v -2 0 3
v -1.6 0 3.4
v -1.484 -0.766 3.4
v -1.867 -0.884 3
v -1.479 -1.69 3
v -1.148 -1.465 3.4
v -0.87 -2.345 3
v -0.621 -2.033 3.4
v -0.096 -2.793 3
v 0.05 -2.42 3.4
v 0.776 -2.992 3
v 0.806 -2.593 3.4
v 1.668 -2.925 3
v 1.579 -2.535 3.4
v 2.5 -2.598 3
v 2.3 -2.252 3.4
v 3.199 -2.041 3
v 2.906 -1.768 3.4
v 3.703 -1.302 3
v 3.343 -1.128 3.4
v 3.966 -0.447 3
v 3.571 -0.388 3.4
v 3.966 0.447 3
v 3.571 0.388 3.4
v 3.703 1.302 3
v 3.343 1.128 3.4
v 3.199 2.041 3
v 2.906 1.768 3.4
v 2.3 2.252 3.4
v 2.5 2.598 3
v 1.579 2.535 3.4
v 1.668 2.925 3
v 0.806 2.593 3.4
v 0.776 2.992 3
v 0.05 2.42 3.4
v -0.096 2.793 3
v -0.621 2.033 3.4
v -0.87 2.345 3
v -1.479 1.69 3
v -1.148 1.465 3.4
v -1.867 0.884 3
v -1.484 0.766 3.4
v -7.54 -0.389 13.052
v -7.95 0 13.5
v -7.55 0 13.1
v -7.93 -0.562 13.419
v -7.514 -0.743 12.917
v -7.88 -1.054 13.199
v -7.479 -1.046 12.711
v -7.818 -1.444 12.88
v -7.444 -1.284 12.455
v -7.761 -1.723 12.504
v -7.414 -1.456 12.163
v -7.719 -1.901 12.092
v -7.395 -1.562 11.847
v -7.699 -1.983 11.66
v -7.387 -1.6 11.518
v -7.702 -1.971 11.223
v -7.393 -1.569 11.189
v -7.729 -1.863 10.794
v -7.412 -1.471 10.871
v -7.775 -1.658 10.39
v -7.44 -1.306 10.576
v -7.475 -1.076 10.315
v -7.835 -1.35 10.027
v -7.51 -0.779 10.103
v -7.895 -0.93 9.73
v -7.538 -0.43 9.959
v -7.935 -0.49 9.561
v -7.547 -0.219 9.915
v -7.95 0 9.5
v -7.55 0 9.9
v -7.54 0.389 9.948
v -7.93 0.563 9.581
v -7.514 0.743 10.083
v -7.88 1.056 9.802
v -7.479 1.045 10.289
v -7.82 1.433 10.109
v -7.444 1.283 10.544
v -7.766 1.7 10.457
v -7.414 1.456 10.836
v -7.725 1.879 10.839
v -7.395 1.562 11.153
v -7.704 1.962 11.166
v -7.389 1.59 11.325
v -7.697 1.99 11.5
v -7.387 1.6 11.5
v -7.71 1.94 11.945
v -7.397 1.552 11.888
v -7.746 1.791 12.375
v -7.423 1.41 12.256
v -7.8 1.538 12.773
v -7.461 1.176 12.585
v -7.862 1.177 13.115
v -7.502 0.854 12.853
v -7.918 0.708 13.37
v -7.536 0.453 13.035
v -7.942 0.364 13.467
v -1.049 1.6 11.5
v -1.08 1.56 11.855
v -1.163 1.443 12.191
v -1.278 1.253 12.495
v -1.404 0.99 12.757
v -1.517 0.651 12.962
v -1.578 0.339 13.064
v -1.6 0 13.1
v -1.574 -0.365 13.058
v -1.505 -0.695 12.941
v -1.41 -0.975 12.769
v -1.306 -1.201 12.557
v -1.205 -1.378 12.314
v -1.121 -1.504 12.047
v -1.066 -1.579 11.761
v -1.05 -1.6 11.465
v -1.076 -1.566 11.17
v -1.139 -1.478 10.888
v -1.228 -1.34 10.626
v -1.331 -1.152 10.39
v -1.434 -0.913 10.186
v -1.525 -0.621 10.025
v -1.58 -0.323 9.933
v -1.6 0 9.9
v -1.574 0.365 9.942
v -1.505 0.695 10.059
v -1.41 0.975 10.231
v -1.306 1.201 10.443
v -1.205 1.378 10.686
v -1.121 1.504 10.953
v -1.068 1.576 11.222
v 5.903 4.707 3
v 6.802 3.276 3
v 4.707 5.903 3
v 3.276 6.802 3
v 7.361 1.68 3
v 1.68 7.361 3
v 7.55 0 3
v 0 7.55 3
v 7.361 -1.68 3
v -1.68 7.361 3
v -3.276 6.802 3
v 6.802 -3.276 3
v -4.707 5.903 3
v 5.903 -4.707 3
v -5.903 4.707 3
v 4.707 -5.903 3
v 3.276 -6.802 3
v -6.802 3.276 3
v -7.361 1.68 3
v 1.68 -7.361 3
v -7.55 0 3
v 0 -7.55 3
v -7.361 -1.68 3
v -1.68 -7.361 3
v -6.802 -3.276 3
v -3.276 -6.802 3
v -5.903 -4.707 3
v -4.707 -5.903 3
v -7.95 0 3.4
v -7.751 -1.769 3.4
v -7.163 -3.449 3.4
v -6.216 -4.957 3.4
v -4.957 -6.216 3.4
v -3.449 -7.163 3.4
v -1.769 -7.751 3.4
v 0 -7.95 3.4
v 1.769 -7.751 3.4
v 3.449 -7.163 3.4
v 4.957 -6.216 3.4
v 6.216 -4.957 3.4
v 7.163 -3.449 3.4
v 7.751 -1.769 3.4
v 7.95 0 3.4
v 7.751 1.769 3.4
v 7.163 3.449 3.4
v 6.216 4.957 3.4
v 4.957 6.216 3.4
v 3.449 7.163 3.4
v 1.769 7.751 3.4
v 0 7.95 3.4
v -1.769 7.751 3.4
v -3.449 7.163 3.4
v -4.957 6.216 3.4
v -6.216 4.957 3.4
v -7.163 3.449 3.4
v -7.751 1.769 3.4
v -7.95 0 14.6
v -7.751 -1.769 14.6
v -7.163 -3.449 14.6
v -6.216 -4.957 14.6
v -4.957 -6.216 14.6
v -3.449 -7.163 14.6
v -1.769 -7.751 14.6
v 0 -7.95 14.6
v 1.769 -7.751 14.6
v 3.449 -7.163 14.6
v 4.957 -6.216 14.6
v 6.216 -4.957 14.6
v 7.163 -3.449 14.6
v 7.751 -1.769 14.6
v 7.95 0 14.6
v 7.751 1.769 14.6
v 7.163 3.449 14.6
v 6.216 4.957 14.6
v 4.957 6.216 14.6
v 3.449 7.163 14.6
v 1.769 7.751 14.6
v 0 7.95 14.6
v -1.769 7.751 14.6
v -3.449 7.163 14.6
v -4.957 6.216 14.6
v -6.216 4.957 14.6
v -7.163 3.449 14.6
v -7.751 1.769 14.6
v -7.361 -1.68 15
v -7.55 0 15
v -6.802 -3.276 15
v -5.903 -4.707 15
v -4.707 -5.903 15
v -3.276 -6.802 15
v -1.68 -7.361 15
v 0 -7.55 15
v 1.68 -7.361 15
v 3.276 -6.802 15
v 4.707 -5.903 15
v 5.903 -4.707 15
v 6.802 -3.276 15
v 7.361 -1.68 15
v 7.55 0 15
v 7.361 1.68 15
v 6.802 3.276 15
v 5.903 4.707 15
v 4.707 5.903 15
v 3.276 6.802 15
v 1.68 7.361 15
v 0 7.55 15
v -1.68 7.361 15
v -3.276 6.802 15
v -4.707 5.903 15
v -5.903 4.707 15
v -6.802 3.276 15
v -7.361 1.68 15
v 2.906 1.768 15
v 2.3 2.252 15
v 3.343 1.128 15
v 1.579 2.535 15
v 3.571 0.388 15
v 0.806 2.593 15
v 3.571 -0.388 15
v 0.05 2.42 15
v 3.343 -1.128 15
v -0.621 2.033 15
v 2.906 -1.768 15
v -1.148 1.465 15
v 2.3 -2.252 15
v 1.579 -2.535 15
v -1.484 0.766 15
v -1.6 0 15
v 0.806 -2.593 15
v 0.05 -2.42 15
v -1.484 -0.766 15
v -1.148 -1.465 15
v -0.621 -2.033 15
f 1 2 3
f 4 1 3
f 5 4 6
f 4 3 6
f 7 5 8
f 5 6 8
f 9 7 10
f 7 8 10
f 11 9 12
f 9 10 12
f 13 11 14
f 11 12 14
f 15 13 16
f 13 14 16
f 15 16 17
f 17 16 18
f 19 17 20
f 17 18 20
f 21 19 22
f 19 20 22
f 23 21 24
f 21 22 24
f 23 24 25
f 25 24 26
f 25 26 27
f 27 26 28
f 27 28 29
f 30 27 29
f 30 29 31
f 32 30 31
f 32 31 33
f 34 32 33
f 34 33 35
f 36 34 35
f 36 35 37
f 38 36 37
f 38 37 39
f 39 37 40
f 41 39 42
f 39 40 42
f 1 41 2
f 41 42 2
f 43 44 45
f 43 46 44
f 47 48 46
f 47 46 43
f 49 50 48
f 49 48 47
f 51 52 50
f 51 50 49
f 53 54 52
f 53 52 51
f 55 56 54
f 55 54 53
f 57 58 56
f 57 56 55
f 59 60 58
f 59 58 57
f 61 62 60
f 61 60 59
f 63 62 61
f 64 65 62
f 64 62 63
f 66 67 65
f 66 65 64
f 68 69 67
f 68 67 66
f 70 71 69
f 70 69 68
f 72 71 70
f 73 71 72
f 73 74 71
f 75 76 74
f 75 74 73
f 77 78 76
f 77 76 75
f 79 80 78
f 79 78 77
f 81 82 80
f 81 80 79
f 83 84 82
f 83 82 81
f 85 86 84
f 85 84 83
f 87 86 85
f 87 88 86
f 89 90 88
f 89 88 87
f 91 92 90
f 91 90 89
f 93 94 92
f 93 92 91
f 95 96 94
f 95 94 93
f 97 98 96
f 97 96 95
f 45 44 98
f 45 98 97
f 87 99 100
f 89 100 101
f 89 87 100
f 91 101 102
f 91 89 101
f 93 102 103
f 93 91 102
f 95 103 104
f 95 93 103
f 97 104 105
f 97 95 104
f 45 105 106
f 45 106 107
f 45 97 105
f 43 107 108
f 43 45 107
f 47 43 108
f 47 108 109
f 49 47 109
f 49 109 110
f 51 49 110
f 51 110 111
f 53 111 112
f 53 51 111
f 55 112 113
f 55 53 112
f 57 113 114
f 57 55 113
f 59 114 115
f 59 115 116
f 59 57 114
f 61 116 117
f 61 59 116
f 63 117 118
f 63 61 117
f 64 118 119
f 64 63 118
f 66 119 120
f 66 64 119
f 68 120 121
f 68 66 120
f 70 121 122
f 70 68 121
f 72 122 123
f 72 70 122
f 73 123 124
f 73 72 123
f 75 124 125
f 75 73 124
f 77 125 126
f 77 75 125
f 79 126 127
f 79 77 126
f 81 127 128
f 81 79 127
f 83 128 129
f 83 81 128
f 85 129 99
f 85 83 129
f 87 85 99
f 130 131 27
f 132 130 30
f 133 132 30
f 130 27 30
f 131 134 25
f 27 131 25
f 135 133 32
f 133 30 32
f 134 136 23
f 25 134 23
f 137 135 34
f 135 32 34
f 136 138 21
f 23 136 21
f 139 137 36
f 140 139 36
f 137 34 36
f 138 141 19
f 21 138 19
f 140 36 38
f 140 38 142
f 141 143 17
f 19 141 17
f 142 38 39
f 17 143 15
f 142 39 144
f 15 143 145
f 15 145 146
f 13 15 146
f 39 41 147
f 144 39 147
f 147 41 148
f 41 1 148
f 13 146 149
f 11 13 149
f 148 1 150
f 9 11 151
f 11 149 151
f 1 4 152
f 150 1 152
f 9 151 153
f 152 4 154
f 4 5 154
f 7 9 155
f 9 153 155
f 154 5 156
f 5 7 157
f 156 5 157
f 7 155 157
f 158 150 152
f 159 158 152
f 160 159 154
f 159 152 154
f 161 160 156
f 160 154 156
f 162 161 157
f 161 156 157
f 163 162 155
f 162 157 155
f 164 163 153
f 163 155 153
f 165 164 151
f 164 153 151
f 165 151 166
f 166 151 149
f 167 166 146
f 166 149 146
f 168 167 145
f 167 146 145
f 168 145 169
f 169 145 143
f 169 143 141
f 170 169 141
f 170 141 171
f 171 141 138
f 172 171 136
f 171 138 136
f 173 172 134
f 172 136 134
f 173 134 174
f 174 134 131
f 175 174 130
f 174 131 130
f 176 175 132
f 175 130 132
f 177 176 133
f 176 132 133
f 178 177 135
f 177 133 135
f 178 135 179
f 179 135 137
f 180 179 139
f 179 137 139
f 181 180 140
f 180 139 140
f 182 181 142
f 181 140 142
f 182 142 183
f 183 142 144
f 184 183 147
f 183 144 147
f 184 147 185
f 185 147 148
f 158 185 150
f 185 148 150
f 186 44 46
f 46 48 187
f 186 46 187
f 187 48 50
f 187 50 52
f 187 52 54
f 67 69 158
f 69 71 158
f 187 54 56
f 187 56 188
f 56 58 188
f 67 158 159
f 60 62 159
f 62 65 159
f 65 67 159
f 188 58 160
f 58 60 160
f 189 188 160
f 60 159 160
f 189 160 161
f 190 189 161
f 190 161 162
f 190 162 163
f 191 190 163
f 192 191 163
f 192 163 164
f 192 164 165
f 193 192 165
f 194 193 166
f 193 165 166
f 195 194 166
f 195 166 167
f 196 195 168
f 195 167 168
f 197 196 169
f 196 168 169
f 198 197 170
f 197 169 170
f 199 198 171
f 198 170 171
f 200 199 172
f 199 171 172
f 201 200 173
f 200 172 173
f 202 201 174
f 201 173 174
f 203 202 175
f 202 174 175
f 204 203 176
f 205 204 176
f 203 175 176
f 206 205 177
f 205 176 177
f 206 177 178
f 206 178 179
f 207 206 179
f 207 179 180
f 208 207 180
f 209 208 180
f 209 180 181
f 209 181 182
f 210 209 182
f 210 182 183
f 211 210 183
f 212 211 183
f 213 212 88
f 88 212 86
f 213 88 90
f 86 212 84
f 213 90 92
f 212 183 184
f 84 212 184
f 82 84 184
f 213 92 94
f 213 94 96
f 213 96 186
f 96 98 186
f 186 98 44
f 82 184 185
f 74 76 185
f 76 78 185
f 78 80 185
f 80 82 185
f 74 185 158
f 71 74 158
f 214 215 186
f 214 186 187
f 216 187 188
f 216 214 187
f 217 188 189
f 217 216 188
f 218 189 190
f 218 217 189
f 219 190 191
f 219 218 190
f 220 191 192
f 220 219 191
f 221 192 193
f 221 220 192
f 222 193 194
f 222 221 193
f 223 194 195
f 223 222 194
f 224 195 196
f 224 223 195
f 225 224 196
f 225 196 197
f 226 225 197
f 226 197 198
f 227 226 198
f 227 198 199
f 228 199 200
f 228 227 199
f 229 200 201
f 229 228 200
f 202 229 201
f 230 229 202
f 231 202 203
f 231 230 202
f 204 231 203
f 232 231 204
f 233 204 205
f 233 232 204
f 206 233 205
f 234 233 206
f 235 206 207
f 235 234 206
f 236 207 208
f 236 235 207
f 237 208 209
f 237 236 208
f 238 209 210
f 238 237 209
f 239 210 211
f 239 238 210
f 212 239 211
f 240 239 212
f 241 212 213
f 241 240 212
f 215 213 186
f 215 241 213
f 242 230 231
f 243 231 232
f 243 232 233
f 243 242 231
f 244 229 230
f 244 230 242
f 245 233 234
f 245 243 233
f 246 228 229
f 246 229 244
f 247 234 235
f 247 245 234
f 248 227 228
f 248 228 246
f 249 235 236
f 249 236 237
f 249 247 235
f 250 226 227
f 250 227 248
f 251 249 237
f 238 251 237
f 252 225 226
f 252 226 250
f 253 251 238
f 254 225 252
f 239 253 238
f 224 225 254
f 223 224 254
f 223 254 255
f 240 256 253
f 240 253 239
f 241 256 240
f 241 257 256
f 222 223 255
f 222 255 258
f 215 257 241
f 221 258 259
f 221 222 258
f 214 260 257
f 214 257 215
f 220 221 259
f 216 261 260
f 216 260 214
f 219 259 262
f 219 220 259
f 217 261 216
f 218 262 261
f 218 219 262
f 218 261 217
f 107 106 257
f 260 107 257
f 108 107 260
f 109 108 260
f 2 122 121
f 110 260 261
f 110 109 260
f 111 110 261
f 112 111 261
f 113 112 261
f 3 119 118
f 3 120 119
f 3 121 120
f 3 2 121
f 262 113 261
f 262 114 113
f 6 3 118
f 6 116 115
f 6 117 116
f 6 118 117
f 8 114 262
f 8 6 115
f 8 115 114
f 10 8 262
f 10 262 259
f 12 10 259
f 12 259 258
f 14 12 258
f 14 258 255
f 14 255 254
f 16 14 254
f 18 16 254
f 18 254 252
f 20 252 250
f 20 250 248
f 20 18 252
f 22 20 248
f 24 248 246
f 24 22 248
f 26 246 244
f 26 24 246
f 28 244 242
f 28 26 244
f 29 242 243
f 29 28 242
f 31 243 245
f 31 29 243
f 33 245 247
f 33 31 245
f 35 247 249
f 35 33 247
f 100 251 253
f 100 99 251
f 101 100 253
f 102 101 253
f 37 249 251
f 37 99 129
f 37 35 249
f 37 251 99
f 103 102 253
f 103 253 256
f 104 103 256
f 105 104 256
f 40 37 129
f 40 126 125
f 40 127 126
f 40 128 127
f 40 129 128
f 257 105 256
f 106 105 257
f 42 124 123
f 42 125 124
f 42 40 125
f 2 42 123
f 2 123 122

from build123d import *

# Parameters (mm, degrees)
SKETCH051_R          = 7.95
SKETCH051_R_2        = 2.6
PAD016_DEPTH         = 12
SKETCH052_R          = 1.6
POCKET_DEPTH         = 8
CHAMFER_SIZE         = 0.4
BODY_PLACEMENT_ANGLE = 90


with BuildPart() as part:
    # Sketch051 → Pad016 (new body)
    with BuildSketch(Plane(origin=(0, 0, 0), x_dir=(0, 1, 0), z_dir=(0, 0, 1))):
        Circle(SKETCH051_R)
        with Locations((-1, 0)):
            Circle(SKETCH051_R_2, mode=Mode.SUBTRACT)
    extrude(amount=PAD016_DEPTH)

    # Sketch052 → Pocket (cut)
    with BuildSketch(Plane.XZ.offset(-8)):
        with Locations((0, 8.5)):
            Circle(SKETCH052_R)
    extrude(amount=POCKET_DEPTH, mode=Mode.SUBTRACT)

    # Chamfer
    chamfer_edges = [part.edges().sort_by_distance(p)[0] for p in [
        (0, -7.95, 0),
        (0, 7.95, 3.45),
        (1.131391, 7.869082, 7.368649),
        (1.131391, 7.869082, 9.631351),
        (0, 7.95, 11.05),
        (0, -7.95, 12),
        (-1.6, 7.787329, 8.5),
        (0, -3.6, 0),
    ]]
    chamfer(chamfer_edges, length=CHAMFER_SIZE)


with BuildPart() as part_1:
    # Body placement: moved
    add(part.part.moved(Location((0, 0, 3))).rotate(Axis((0, 0, 3), (0, 0, 1)), BODY_PLACEMENT_ANGLE))


solid = part_1.part
